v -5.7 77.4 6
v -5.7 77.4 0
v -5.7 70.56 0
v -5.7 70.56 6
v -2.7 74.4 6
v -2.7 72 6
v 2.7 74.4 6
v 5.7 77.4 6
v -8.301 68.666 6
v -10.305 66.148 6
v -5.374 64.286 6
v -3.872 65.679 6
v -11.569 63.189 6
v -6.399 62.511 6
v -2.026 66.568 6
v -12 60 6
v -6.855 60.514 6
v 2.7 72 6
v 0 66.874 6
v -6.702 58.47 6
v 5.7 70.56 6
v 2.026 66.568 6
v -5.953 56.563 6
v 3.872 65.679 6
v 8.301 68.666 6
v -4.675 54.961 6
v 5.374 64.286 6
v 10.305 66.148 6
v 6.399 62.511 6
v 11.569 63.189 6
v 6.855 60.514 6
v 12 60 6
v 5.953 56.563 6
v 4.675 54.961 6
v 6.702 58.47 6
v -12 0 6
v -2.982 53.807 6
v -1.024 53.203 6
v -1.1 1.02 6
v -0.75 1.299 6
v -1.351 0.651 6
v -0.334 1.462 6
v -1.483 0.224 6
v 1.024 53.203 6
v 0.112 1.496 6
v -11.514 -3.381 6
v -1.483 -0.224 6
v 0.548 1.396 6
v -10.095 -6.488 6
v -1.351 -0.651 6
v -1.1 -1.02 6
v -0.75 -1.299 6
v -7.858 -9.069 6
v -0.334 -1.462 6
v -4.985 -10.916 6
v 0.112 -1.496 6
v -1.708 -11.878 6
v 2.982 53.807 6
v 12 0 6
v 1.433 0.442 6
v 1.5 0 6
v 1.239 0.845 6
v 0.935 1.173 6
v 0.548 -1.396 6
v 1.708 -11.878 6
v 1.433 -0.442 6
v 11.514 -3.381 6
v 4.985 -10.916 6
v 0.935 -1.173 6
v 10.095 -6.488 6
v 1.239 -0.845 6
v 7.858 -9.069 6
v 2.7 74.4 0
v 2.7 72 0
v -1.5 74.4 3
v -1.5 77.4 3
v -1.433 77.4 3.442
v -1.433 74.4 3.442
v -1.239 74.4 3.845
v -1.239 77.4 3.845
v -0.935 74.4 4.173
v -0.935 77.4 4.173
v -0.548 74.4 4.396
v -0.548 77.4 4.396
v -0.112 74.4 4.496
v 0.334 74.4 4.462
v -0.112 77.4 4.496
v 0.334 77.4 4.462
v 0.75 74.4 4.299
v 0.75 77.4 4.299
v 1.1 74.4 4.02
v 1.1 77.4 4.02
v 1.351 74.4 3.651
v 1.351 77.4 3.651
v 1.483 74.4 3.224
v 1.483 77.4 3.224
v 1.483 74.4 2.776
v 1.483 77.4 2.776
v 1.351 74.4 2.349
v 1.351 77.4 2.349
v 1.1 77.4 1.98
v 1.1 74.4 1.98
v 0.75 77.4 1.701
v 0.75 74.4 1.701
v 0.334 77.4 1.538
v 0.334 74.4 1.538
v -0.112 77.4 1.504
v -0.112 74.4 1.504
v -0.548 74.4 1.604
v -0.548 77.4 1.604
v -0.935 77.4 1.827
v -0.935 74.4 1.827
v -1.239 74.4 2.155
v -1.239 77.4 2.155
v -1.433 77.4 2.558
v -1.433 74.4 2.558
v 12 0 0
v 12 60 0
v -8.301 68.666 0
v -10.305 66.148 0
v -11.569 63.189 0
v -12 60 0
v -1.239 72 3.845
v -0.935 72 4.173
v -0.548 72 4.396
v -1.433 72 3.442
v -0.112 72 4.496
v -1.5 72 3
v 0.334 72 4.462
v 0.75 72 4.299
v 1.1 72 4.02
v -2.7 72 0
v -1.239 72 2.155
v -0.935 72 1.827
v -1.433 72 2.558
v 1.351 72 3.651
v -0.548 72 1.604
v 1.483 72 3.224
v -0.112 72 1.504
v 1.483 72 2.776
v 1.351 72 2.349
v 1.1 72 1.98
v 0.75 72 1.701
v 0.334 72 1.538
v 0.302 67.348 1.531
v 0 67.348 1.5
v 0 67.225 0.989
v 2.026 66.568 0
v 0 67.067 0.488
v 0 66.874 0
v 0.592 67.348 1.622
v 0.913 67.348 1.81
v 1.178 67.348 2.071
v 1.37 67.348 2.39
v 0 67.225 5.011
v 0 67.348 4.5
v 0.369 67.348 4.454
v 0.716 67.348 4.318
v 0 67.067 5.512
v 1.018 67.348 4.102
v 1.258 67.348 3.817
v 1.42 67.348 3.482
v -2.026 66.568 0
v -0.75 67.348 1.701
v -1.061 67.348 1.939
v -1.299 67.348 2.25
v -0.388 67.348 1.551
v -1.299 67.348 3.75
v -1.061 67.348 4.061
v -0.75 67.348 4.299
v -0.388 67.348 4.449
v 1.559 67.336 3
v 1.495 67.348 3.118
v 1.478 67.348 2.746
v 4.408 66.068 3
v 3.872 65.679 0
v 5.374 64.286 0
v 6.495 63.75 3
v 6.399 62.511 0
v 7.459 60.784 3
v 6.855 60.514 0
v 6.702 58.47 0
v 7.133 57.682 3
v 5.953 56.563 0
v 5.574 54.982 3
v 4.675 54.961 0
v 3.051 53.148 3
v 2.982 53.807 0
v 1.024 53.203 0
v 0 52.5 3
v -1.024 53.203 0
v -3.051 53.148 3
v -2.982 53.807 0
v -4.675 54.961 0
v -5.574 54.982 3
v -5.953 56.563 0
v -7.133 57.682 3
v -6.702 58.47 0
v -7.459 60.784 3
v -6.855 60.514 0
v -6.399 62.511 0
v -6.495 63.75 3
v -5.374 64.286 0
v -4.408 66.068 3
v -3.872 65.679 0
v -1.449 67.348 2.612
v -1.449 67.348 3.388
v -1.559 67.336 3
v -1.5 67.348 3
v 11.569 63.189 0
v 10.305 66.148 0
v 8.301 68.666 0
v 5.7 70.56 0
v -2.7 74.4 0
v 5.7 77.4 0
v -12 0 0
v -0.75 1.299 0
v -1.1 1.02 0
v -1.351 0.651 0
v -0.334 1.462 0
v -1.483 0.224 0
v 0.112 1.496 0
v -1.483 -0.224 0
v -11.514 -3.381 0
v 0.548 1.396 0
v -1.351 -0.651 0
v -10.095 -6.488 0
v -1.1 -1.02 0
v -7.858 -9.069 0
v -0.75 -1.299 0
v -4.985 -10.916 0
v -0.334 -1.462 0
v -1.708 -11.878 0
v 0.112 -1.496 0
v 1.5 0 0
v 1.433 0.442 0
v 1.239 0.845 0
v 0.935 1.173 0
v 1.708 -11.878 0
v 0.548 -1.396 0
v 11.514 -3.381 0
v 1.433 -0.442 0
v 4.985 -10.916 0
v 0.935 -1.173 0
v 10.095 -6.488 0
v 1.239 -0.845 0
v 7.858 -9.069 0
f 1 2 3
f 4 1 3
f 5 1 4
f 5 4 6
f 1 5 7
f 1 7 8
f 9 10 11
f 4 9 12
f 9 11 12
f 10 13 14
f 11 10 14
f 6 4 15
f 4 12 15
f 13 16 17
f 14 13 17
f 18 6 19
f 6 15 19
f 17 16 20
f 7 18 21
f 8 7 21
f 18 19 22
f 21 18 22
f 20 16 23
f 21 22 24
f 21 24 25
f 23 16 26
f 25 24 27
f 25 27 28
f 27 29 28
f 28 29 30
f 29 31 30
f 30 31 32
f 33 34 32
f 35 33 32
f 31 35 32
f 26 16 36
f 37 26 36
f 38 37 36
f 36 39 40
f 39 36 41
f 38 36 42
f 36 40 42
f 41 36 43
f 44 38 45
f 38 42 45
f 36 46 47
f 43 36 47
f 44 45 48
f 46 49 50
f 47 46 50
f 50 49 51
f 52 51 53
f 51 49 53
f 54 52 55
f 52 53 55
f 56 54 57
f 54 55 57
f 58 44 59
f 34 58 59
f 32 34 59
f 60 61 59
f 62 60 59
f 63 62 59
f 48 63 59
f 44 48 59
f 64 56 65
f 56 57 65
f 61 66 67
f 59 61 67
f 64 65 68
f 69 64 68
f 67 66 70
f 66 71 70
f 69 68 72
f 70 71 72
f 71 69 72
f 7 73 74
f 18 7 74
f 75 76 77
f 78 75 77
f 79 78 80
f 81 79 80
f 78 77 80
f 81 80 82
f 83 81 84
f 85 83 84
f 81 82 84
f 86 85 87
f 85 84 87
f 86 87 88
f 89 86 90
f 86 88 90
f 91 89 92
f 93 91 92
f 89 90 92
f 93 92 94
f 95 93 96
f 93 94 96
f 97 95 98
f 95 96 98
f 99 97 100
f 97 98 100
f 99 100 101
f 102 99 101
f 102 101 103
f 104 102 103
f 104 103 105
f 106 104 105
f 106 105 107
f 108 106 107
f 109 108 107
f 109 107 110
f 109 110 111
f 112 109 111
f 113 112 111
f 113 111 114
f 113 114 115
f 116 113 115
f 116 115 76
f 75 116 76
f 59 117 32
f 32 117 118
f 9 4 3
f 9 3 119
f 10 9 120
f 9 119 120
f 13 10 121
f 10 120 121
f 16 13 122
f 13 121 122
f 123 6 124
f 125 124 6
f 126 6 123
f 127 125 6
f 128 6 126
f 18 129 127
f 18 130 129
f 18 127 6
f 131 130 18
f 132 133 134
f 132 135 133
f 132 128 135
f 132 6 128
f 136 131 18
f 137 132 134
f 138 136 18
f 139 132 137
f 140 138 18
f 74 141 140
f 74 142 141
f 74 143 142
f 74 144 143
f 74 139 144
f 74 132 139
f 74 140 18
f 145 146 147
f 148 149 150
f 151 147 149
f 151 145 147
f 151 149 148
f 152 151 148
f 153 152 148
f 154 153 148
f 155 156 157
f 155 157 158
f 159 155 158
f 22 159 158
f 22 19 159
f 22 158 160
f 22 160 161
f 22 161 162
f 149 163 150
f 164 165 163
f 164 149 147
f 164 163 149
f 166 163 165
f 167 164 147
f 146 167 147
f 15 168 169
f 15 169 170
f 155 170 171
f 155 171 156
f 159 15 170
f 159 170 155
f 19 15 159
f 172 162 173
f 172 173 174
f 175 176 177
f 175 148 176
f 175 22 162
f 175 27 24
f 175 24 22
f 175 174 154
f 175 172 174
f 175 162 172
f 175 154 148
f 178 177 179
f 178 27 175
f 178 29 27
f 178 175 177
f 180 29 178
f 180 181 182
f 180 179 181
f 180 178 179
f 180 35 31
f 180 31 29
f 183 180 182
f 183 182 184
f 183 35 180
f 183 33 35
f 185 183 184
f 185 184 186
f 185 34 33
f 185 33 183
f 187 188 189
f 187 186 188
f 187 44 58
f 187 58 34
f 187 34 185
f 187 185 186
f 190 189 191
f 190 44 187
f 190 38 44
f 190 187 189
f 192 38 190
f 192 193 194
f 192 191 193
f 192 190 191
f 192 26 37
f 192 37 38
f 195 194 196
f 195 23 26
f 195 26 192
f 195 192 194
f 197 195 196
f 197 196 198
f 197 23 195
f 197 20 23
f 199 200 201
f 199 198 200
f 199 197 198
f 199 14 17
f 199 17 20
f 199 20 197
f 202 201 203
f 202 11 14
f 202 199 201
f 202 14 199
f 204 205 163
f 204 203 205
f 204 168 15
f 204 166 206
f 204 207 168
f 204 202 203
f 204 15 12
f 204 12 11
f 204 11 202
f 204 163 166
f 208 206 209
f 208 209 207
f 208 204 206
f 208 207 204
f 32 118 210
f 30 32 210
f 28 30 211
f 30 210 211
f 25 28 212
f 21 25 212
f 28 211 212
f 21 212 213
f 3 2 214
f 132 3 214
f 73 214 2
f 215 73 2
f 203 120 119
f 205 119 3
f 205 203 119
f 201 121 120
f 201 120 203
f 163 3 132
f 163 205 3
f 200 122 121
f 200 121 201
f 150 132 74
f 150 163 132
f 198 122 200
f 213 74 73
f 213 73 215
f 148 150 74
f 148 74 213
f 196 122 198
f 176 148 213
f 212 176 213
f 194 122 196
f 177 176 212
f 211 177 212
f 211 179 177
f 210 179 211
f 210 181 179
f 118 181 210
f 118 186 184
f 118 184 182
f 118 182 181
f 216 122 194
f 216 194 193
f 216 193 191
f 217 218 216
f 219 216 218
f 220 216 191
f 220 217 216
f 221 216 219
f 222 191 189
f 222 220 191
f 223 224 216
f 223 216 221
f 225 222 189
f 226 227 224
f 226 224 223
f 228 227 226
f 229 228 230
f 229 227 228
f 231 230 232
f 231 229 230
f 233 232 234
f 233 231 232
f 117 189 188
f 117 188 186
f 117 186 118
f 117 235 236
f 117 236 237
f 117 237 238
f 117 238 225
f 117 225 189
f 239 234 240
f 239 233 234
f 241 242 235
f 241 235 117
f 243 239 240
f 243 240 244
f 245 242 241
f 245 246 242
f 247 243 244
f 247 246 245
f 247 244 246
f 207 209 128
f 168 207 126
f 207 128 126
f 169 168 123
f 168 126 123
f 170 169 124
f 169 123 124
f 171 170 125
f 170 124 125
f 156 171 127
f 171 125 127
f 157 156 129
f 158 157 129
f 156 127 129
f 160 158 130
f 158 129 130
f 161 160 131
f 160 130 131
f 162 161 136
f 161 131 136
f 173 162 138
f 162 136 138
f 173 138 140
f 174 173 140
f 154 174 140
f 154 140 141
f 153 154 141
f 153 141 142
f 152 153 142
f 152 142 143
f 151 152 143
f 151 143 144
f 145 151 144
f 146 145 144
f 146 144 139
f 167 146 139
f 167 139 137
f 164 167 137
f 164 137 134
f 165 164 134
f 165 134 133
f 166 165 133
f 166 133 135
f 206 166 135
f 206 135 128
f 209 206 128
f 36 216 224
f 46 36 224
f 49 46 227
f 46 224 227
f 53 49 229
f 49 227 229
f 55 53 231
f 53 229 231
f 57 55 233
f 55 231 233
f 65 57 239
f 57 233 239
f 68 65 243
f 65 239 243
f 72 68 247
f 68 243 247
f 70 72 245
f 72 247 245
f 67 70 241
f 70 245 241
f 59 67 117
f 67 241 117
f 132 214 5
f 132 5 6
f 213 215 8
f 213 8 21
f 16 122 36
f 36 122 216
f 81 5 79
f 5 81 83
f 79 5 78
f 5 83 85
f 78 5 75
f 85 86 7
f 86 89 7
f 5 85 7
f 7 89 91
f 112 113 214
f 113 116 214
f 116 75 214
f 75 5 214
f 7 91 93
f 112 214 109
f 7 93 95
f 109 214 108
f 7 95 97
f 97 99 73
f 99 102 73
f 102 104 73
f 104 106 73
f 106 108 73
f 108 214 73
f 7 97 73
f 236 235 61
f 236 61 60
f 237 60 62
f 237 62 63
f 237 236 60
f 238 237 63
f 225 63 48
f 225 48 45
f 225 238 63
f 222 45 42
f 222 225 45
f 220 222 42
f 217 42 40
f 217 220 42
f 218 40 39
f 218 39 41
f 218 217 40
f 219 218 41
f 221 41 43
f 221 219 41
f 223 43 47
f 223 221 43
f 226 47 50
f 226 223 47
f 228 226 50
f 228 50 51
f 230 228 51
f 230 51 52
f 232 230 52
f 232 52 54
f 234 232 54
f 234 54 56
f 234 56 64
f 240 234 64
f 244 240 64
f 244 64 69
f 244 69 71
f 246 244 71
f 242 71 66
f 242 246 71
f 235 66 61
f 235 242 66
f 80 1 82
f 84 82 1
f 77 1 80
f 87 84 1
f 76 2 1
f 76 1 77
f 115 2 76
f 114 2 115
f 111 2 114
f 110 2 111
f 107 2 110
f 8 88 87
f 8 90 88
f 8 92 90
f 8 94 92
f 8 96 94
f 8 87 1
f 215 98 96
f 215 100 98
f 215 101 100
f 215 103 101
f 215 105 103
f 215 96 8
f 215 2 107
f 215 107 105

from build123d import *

# Parameters (mm, degrees)
F0_R     = 1.5
F1_DEPTH = 6
F3_W     = 11.4
F3_H     = 9.9
F3_W_2   = 5.4
F3_H_2   = 2.4
F4_DEPTH = 6
F6_R     = 1.5
F7_DEPTH = 11.0515308717


with BuildPart() as f1:
    # F0 (on Top) → F1 (new body)
    with BuildSketch(Plane.XY):
        with BuildLine():
            Line((-12, 60), (-12, 0))
            ThreePointArc((-12, 0), (0, -12), (12, 0))
            Line((12, 0), (12, 60))
            ThreePointArc((12, 60), (0, 72), (-12, 60))
        make_face()
        Circle(F0_R, mode=Mode.SUBTRACT)
    extrude(amount=F1_DEPTH)

    # F3 (on face) → F4 (join, through all)
    with BuildSketch(Plane(origin=(0, 0, 0), x_dir=(1, 0, 0), z_dir=(0, 0, -1))):
        with Locations((0, -72.45)):
            Rectangle(F3_W, F3_H)
        with Locations((0, -73.2)):
            Rectangle(F3_W_2, F3_H_2, mode=Mode.SUBTRACT)
    extrude(amount=-F4_DEPTH)

    # F2 (on Right) → F5 (revolve, cut)
    with BuildSketch(Plane.YZ):
        with BuildLine():
            ThreePointArc((60, -4.5), (67.5, 3), (60, 10.5))
            Line((60, 10.5), (60, -4.5))
        make_face()
    revolve(axis=Axis((0, 60, 3), (0, 0, -1)), mode=Mode.SUBTRACT)

    # F6 (on face) → F7 (cut, up to face)
    with BuildSketch(Plane(origin=(0, 77.4, 0), x_dir=(-1, 0, 0), z_dir=(0, 1, 0))):
        with Locations((0, 3)):
            Circle(F6_R)
    extrude(amount=-F7_DEPTH, mode=Mode.SUBTRACT)


solid = f1.part
